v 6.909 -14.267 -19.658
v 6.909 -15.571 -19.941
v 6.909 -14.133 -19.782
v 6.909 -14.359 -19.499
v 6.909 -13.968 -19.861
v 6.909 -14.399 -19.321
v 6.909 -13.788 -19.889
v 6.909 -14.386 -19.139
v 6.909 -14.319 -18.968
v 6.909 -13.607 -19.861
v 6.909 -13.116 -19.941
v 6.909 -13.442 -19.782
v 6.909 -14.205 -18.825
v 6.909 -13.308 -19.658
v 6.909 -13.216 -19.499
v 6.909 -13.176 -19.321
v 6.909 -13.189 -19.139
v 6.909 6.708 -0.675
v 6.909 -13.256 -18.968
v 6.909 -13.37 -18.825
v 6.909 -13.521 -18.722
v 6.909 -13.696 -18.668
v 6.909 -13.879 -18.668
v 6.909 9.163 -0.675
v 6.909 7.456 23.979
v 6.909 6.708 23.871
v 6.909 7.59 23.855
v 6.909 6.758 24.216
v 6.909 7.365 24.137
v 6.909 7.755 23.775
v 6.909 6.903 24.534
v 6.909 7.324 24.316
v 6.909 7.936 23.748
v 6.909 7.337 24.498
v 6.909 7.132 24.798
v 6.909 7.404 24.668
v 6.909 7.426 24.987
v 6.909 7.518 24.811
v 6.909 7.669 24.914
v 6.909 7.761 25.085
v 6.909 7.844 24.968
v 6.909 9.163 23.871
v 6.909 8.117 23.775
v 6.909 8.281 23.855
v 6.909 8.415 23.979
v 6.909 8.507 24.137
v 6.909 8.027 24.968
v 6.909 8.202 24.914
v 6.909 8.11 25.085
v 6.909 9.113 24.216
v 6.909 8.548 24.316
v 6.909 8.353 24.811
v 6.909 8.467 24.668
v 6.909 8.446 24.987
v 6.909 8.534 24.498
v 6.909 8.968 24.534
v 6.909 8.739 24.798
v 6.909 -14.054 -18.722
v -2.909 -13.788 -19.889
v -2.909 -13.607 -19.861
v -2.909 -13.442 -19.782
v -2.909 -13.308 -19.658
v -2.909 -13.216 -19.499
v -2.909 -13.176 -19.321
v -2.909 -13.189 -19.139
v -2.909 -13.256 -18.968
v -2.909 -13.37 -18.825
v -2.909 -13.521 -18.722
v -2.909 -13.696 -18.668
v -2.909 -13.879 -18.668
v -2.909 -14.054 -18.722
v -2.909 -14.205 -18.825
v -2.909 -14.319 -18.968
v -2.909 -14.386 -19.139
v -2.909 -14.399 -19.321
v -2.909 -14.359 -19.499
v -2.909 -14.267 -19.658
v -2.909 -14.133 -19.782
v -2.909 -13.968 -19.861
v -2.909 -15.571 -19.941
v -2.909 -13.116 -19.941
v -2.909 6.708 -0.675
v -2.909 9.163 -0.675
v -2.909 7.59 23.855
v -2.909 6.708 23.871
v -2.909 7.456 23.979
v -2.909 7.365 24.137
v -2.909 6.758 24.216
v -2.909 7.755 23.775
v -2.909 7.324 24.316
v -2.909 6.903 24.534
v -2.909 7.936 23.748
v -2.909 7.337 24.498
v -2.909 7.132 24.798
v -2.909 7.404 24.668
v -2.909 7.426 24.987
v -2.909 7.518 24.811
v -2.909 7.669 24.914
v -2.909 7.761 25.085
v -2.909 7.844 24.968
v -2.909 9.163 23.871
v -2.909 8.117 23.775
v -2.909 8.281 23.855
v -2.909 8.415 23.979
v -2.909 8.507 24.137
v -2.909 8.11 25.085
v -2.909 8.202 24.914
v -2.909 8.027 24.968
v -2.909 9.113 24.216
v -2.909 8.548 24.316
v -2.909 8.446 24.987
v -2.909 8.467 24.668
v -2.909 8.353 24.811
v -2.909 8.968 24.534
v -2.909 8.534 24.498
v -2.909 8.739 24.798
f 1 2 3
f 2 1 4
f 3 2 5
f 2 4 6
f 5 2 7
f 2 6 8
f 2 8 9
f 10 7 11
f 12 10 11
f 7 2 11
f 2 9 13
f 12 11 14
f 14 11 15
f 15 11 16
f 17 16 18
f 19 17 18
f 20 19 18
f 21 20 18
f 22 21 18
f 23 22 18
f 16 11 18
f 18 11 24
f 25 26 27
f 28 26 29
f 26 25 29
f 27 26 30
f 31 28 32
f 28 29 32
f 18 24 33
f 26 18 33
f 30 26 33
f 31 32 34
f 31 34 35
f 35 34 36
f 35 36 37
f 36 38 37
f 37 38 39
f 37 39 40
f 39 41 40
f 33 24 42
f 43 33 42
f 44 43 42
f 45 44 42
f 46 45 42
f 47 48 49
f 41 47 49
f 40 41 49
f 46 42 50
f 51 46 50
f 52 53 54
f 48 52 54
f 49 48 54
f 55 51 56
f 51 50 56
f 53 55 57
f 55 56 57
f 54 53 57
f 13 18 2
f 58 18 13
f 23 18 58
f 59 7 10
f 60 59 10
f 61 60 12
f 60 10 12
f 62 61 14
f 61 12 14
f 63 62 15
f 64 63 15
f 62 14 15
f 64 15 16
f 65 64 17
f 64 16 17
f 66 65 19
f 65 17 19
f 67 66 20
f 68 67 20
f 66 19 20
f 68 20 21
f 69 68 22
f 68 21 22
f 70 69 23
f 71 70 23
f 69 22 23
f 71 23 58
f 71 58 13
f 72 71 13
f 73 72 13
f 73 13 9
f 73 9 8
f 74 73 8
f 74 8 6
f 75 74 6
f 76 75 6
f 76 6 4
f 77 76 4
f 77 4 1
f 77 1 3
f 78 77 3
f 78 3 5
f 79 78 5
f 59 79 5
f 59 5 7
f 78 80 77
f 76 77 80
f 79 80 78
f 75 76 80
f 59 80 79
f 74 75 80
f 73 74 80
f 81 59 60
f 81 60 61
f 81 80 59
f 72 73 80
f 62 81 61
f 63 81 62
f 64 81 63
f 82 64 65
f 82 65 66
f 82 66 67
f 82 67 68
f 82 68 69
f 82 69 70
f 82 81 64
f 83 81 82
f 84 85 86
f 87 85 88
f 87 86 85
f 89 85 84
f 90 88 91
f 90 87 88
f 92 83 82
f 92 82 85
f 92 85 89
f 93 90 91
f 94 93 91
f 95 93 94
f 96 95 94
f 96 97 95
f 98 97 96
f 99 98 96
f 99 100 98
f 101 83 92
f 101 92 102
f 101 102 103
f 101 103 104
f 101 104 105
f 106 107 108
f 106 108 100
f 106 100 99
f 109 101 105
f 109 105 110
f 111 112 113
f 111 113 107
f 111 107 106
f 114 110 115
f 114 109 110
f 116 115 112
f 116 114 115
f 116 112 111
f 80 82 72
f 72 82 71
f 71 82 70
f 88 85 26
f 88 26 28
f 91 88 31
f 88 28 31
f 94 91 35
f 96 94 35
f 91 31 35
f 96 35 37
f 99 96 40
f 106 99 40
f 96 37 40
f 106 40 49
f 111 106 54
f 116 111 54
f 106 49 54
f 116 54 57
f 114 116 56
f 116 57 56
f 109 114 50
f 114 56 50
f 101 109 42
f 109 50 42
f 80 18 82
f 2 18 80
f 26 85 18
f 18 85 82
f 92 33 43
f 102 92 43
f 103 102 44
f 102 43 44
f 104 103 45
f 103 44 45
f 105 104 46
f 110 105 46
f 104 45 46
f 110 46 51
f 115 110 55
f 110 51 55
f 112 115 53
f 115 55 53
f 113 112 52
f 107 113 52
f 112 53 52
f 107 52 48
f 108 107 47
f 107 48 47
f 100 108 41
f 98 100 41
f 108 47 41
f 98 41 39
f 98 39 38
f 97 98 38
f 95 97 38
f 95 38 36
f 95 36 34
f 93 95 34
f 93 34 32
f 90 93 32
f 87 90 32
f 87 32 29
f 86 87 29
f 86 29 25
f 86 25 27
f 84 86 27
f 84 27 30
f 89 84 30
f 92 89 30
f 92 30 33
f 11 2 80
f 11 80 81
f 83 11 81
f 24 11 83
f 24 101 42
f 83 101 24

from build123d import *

# Parameters (mm, degrees)
SKETCH_1_W          = 10
SKETCH_1_H          = 1
EXTRUDE_1_DEPTH     = 4
EXTRUDE_2_DEPTH     = 4
EXTRUDE_4_DEPTH     = 4
SKETCH_8_R          = 0.25
CUT_EXTRUDE_1_DEPTH = 10
SKETCH_9_R          = 0.25
CUT_EXTRUDE_2_DEPTH = 10
SCALE_1_SCALE       = 2.454545455


with BuildPart() as part:
    # 草图1 → 凸台-拉伸1 (new body)
    with BuildSketch(Plane(origin=(0, 0, 0), x_dir=(0, 0, -1), z_dir=(1, 0, 0))):
        with Locations((-6.174242424, 5.174378087)):
            Rectangle(SKETCH_1_W, SKETCH_1_H)
    extrude(amount=EXTRUDE_1_DEPTH)

    # 草图4 → 凸台-拉伸2 (add)
    with BuildSketch(Plane(origin=(4, 0, 0), x_dir=(0, 0, -1), z_dir=(1, 0, 0))):
        Polygon((-1.174242424, 5.674378087), (-1.174242424, 4.674378087), (6.675052733, -4.402436637), (6.675052733, -3.402436637), align=None)
    extrude(amount=-EXTRUDE_2_DEPTH)

    # 草图7 → 凸台-拉伸4 (add)
    with BuildSketch(Plane(origin=(4, 0, 0), x_dir=(0, 0, -1), z_dir=(1, 0, 0))):
        with BuildLine():
            Line((-11.174242424, 5.674378087), (-11.174242424, 4.674378087))
            ThreePointArc((-11.174242424, 4.674378087), (-11.674242424, 5.174378087), (-11.174242424, 5.674378087))
        make_face()
    extrude(amount=-EXTRUDE_4_DEPTH)

    # 草图8 → 切除-拉伸1 (cut)
    with BuildSketch(Plane(origin=(4, 0, 0), x_dir=(0, 0, -1), z_dir=(1, 0, 0))):
        with Locations((-11.374242424, 5.174378087)):
            Circle(SKETCH_8_R)
    extrude(amount=-CUT_EXTRUDE_1_DEPTH, mode=Mode.SUBTRACT)

    # 草图9 → 切除-拉伸2 (cut)
    with BuildSketch(Plane(origin=(4, 0, 0), x_dir=(0, 0, -1), z_dir=(1, 0, 0))):
        with Locations((6.403659304, -3.675825169)):
            Circle(SKETCH_9_R)
    extrude(amount=-CUT_EXTRUDE_2_DEPTH, mode=Mode.SUBTRACT)


with BuildPart() as part_1:
    # 缩放比例1: scaled about (2, 3.275952111, 2.445427585)
    add(part.part.scale(SCALE_1_SCALE).moved(Location((-2.909090909, -4.765021252, -3.556985578))))


solid = part_1.part
